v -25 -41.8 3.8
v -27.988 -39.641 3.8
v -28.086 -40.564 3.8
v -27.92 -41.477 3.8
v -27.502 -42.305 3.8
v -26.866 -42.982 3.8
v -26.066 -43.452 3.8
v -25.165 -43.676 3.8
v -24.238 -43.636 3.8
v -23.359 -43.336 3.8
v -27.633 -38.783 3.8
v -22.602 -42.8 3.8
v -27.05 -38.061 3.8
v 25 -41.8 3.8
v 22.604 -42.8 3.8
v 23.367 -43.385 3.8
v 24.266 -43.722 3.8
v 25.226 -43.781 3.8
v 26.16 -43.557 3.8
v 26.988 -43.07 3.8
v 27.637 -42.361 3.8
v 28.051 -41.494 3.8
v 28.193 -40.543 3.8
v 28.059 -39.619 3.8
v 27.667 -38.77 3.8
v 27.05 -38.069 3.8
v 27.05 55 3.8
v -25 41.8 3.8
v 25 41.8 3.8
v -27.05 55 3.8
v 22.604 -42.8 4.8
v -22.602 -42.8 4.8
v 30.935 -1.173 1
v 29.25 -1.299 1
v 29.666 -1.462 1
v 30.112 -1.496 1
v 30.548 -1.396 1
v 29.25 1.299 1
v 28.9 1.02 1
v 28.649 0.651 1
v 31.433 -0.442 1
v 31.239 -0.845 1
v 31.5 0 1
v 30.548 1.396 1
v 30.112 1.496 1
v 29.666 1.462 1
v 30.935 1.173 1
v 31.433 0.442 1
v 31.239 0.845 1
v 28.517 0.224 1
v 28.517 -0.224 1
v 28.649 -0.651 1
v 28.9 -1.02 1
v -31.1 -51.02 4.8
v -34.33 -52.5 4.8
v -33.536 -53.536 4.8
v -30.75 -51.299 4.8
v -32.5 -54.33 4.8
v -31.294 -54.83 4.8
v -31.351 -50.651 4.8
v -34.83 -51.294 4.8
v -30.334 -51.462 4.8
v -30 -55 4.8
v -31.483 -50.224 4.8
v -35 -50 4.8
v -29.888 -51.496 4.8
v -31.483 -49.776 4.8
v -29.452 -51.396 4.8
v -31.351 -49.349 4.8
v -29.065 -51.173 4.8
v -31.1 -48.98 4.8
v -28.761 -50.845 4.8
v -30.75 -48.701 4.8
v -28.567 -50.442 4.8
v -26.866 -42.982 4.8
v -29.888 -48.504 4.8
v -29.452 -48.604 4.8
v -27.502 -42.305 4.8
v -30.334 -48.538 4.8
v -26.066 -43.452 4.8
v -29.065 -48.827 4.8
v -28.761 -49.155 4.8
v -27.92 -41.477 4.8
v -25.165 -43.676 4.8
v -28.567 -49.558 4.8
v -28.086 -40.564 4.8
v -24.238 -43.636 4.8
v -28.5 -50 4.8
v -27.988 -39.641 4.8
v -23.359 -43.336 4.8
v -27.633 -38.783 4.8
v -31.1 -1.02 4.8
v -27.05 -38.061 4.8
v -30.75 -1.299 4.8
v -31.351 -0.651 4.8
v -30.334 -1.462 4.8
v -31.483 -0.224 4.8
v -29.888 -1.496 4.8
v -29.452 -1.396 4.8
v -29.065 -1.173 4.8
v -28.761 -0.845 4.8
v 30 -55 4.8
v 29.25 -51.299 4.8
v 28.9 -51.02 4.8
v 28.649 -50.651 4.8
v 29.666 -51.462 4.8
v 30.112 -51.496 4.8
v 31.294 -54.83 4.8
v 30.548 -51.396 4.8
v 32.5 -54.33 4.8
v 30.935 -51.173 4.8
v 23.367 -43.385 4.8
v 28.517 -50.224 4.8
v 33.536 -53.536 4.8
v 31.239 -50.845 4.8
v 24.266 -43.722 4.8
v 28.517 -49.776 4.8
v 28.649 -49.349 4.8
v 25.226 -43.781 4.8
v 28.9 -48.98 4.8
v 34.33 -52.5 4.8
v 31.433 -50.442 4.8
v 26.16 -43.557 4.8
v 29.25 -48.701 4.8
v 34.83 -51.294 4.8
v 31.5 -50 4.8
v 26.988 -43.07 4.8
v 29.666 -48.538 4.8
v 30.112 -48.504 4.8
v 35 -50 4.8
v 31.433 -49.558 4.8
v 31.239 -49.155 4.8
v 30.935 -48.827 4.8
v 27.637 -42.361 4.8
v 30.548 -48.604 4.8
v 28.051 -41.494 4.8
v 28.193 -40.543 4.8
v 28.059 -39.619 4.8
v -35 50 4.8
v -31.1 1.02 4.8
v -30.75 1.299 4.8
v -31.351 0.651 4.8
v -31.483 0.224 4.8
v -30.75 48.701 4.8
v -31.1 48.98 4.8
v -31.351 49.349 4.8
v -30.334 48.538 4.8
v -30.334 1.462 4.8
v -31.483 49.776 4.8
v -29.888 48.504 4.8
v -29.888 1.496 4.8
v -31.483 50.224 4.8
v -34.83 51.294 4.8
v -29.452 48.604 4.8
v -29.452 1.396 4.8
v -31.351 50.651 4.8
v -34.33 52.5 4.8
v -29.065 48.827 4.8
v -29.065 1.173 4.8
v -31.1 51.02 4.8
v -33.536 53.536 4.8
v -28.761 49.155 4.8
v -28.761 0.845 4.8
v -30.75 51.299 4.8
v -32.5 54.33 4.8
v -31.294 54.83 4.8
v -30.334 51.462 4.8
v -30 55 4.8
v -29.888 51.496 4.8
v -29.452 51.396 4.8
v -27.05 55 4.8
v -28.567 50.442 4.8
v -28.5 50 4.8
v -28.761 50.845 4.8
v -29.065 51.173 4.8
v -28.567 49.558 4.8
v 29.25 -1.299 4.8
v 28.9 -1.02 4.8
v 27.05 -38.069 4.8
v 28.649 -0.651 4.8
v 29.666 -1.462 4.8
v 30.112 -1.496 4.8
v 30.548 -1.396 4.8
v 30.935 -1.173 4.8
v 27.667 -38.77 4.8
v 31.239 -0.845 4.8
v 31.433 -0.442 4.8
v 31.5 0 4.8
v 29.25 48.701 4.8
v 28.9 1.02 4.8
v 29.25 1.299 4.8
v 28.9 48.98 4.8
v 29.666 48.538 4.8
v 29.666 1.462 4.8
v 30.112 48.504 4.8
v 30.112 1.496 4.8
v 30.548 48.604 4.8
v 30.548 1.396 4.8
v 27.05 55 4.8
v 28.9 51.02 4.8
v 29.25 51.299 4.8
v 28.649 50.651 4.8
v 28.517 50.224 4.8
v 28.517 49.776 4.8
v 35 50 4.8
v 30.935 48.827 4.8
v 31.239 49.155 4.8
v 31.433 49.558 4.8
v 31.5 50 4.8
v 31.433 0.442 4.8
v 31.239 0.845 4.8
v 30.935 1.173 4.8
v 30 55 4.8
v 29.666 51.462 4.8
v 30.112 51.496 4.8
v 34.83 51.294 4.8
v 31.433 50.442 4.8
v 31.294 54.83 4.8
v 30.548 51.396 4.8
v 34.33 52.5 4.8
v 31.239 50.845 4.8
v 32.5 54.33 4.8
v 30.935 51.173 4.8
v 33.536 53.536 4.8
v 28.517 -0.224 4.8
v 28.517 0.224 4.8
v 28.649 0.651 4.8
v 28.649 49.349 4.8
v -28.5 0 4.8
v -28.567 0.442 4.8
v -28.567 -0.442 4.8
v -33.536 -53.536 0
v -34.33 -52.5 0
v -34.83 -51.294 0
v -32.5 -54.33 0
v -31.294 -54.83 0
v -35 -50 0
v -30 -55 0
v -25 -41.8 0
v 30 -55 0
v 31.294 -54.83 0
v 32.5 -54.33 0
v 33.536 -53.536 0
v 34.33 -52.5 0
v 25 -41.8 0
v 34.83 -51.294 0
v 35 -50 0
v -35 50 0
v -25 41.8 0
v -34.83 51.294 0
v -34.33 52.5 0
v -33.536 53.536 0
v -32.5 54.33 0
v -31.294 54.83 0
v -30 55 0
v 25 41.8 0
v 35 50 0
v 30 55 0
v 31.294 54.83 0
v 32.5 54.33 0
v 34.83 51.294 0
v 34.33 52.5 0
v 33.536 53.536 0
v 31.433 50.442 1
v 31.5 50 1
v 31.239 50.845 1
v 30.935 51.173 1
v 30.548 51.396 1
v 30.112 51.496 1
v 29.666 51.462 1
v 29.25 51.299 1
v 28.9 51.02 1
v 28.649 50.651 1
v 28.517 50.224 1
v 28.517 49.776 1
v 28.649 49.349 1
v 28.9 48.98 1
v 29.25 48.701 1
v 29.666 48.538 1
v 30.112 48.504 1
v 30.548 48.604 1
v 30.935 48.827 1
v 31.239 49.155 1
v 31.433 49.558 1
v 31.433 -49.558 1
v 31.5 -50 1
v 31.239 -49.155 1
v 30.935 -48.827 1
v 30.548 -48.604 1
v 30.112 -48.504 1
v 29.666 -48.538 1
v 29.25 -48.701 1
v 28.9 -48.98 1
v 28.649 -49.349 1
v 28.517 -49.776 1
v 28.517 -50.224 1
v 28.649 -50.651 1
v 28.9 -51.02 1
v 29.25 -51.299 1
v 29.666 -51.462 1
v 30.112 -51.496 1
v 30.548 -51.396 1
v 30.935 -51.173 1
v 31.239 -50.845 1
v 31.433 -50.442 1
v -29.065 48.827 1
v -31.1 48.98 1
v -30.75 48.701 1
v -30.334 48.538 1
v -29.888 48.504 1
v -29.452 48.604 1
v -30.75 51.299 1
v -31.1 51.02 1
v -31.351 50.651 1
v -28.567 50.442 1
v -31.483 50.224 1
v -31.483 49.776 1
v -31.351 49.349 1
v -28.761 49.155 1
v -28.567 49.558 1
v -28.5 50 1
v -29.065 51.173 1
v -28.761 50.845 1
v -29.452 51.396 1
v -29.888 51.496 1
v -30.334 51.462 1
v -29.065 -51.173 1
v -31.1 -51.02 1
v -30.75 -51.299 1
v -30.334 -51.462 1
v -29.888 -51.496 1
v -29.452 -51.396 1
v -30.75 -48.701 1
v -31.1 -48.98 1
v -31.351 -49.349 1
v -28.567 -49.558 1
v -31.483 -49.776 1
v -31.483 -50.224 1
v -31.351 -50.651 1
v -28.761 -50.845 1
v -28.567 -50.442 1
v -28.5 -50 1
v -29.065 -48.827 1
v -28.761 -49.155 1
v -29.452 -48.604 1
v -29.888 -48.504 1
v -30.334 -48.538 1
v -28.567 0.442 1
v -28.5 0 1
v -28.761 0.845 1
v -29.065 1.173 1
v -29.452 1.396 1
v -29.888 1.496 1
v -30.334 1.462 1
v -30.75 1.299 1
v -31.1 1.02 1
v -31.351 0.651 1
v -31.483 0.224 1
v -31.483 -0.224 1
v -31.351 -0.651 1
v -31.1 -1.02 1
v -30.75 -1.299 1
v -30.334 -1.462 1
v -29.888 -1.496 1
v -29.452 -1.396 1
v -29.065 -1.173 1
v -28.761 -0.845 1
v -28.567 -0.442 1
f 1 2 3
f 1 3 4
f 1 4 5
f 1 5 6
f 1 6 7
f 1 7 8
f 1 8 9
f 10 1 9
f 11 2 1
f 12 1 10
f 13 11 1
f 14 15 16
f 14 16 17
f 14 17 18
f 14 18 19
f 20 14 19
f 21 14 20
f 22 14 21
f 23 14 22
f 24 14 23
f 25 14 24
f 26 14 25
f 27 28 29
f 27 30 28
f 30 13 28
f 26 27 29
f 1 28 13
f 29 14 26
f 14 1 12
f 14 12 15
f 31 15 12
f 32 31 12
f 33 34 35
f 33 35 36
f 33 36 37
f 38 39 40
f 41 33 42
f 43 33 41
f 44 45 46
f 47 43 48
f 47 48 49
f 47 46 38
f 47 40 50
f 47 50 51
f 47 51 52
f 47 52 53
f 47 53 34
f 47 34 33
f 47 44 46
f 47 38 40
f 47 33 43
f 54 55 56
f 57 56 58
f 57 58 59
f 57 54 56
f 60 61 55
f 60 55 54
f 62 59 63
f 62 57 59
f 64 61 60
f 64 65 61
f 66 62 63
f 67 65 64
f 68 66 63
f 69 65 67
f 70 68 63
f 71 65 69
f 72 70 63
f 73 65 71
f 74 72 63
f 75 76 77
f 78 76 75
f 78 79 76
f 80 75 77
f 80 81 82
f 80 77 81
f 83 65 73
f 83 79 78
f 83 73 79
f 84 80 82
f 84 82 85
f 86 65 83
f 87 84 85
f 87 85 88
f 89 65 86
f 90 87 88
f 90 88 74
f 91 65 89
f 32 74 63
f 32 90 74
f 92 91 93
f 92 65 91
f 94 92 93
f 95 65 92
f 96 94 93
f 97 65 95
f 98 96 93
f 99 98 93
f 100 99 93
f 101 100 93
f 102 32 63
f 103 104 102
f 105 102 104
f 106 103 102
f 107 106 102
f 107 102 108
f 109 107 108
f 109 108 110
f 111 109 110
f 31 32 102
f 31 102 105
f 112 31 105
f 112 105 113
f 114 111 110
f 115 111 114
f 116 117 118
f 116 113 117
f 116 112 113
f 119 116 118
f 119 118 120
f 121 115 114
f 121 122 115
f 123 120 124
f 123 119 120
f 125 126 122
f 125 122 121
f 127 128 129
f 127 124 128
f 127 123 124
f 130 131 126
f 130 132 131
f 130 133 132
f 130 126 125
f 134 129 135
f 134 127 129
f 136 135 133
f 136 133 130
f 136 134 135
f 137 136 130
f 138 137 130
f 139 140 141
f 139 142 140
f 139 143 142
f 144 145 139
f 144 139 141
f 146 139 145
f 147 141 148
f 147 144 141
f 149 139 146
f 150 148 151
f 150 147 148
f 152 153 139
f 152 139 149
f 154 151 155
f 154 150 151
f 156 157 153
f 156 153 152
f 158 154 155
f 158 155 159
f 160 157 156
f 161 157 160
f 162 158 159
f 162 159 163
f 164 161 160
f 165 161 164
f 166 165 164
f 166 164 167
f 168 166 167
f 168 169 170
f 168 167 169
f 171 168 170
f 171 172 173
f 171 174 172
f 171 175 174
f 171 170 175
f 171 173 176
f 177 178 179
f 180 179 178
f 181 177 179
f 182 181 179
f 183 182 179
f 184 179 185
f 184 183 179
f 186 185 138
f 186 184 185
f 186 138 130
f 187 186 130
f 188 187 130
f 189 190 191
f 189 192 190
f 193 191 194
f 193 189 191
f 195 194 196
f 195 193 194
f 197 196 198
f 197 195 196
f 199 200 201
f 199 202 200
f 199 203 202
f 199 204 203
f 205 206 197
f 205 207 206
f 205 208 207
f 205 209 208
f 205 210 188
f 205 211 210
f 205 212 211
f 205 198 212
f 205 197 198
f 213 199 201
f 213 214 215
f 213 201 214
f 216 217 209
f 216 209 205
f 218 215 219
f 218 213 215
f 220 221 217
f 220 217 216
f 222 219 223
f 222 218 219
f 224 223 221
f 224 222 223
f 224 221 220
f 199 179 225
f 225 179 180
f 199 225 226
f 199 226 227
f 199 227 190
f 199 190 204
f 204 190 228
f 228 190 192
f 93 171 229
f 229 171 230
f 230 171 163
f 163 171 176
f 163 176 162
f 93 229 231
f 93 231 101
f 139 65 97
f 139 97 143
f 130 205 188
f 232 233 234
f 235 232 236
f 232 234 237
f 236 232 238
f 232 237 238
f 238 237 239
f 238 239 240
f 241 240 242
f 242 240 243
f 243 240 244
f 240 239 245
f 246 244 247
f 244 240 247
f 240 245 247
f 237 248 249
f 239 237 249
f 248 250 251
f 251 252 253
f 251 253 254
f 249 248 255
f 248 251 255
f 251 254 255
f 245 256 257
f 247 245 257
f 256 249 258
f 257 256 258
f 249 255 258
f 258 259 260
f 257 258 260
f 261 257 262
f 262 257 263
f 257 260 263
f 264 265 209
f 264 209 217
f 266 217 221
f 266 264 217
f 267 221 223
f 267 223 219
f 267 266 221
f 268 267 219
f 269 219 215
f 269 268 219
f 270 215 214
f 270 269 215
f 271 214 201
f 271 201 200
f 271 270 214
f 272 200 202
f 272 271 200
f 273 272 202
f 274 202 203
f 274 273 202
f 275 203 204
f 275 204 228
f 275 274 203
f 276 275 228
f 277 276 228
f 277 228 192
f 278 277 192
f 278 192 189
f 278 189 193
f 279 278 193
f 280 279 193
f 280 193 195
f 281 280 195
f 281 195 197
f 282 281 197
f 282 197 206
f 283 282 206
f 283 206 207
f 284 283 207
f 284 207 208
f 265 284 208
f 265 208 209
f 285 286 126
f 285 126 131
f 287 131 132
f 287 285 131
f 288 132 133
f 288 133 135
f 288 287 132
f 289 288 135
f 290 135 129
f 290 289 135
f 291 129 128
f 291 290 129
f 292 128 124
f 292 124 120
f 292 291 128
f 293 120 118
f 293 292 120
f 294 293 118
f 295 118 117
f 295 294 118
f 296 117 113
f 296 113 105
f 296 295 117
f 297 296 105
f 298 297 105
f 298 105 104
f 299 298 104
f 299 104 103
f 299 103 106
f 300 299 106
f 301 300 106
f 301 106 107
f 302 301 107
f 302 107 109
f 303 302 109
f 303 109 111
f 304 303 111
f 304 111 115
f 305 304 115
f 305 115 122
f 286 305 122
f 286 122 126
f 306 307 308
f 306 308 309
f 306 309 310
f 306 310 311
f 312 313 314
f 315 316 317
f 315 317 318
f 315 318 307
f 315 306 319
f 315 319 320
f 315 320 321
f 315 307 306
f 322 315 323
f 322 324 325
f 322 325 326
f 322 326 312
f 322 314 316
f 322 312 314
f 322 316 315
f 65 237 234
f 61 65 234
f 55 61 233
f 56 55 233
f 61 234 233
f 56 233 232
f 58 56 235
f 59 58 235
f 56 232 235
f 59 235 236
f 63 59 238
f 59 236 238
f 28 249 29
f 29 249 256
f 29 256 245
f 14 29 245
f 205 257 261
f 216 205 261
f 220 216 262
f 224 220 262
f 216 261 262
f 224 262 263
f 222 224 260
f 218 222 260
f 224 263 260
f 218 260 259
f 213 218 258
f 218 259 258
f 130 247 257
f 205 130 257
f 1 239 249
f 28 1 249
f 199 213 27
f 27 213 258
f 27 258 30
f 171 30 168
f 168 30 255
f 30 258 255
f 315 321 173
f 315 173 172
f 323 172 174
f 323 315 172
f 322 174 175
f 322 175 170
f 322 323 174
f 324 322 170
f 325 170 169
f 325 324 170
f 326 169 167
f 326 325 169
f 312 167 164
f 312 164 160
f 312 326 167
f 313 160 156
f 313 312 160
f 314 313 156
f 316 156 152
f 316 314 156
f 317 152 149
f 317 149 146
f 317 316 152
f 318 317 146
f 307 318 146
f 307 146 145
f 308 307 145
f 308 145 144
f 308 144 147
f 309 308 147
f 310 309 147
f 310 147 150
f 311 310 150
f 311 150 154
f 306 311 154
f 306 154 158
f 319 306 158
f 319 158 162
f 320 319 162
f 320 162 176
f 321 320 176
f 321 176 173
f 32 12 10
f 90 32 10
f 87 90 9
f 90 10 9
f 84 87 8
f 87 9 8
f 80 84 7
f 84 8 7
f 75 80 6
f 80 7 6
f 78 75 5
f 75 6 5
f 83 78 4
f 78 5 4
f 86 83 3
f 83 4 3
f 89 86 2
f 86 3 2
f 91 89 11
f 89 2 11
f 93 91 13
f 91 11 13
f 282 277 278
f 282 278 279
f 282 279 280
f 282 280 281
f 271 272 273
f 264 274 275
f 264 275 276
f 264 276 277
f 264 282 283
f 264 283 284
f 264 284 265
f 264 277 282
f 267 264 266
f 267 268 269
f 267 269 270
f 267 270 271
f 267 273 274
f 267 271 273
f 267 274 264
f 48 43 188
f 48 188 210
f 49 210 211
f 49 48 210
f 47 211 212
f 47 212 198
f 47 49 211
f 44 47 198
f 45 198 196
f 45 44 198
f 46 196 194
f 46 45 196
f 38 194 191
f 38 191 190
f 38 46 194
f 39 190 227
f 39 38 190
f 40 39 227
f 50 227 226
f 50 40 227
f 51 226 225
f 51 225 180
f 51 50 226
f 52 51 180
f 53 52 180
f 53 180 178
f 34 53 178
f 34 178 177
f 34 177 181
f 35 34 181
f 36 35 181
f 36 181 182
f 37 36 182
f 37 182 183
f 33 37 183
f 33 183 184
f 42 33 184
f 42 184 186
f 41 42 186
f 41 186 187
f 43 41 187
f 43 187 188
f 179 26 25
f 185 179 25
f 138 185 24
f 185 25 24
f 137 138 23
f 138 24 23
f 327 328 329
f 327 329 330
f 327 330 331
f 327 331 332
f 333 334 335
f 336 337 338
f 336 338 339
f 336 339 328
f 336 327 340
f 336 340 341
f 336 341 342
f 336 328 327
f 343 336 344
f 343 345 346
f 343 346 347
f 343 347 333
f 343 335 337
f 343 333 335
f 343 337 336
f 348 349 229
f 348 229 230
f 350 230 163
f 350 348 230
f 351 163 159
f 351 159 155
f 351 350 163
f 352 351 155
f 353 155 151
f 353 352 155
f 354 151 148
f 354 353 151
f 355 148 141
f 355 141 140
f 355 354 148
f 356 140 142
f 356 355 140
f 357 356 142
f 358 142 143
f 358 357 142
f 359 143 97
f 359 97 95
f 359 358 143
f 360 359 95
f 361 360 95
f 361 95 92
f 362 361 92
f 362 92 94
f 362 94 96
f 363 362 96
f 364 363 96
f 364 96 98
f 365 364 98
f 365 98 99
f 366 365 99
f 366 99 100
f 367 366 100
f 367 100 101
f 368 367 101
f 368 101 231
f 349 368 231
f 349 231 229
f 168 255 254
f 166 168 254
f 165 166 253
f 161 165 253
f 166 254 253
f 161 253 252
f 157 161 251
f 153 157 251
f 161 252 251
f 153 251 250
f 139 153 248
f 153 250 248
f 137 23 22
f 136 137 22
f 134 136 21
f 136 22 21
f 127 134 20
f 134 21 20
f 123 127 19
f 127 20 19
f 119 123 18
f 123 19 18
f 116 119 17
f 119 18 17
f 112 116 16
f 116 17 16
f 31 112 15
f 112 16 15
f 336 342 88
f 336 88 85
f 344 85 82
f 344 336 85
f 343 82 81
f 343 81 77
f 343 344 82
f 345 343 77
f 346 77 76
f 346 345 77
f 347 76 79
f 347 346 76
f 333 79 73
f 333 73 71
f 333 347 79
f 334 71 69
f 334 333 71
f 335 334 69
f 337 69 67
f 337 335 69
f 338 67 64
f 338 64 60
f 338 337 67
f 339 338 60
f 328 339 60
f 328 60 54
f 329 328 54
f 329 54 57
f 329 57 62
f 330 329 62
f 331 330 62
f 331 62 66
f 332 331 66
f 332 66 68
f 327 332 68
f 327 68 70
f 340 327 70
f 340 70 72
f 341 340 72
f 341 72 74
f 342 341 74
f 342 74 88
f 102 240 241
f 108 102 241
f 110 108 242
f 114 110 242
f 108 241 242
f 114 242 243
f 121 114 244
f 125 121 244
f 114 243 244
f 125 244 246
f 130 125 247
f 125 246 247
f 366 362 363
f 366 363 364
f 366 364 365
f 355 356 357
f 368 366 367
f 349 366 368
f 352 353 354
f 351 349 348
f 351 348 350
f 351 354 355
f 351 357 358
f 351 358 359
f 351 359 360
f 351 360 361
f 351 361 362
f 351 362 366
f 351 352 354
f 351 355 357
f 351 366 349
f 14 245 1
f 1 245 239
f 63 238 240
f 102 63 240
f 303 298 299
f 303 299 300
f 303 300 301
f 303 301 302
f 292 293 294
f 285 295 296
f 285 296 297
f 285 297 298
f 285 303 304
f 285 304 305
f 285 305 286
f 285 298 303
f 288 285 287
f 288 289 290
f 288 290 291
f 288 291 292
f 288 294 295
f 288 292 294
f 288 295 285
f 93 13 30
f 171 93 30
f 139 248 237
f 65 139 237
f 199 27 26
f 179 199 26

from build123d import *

# Parameters (mm, degrees)
F0_R     = 1.5
F1_DEPTH = 1
F2_DEPTH = 3.8
F3_DEPTH = 4.8


with BuildPart() as f1:
    # F0 (on Top) → F1 (new body)
    with BuildSketch(Plane.XY):
        with Locations((-30, 50)):
            Circle(F0_R)
    extrude(amount=F1_DEPTH)



with BuildPart() as f1b:
    # F0 (on Top) → F1, piece 2 (new body)
    with BuildSketch(Plane.XY):
        with Locations((30, 50)):
            Circle(F0_R)
    extrude(amount=F1_DEPTH)


with BuildPart() as f1c:
    # F0 (on Top) → F1, piece 3 (new body)
    with BuildSketch(Plane.XY):
        with Locations((30, 0)):
            Circle(F0_R)
    extrude(amount=F1_DEPTH)


with BuildPart() as f1d:
    # F0 (on Top) → F1, piece 4 (new body)
    with BuildSketch(Plane.XY):
        with Locations((30, -50)):
            Circle(F0_R)
    extrude(amount=F1_DEPTH)


with BuildPart() as f1e:
    # F0 (on Top) → F1, piece 5 (new body)
    with BuildSketch(Plane.XY):
        with Locations((-30, -50)):
            Circle(F0_R)
    extrude(amount=F1_DEPTH)


with BuildPart() as f1f:
    # F0 (on Top) → F1, piece 6 (new body)
    with BuildSketch(Plane.XY):
        with Locations((-30, 0)):
            Circle(F0_R)
    extrude(amount=F1_DEPTH)


with BuildPart() as f2:
    # F0 (on Top) → F2 (new body)
    with BuildSketch(Plane.XY):
        with BuildLine():
            Line((27.05, 42.8), (27.05, 55))
            Line((27.05, 55), (-27.05, 55))
            Line((-27.05, 55), (-27.05, 42.8))
            Line((-27.05, 42.8), (-27.05, -38.0607364771))
            ThreePointArc((-27.05, -38.0607364771), (-26.1012649001, -37.4476793164), (-25, -37.196376726))
            Line((-25, -37.196376726), (-25, 41.8))
            Line((-25, 41.8), (25, 41.8))
            Line((25, 41.8), (25, -37.2939372294))
            ThreePointArc((25, -37.2939372294), (26.0922729799, -37.5033114474), (27.05, -38.0686934251))
            Line((27.05, -38.0686934251), (27.05, 42.8))
        make_face()
        with BuildLine():
            ThreePointArc((-25, -37.196376726), (-26.1012649001, -37.4476793164), (-27.05, -38.0607364771))
            Line((-27.05, -38.0607364771), (-27.05, -42.8))
            Line((-27.05, -42.8), (-22.6016124349, -42.8))
            ThreePointArc((-22.6016124349, -42.8), (-22.1959427347, -42.3341702613), (-21.8857373462, -41.8))
            Line((-21.8857373462, -41.8), (-25, -41.8))
            Line((-25, -41.8), (-25, -37.196376726))
        make_face()
        with BuildLine():
            Line((-27.05, -42.8), (-27.05, -38.0607364771))
            ThreePointArc((-27.05, -38.0607364771), (-27.208254731, -42.6665921352), (-22.6016124349, -42.8))
            Line((-22.6016124349, -42.8), (-27.05, -42.8))
        make_face()
        with BuildLine():
            ThreePointArc((-21.8857373462, -41.8), (-22.1959427347, -42.3341702613), (-22.6016124349, -42.8))
            Line((-22.6016124349, -42.8), (22.6044172499, -42.8))
            ThreePointArc((22.6044172499, -42.8), (22.2287912639, -42.3305781393), (21.9460571083, -41.8))
            Line((21.9460571083, -41.8), (-21.8857373462, -41.8))
        make_face()
        with BuildLine():
            Line((27.05, -42.8), (27.05, -38.0686934251))
            ThreePointArc((27.05, -38.0686934251), (26.0922729799, -37.5033114474), (25, -37.2939372294))
            Line((25, -37.2939372294), (25, -41.8))
            Line((25, -41.8), (21.9460571083, -41.8))
            ThreePointArc((21.9460571083, -41.8), (22.2287912639, -42.3305781393), (22.6044172499, -42.8))
            Line((22.6044172499, -42.8), (27.05, -42.8))
        make_face()
        with BuildLine():
            ThreePointArc((28.1933165581, -40.5434428822), (27.8936742641, -39.1803987131), (27.05, -38.0686934251))
            Line((27.05, -38.0686934251), (27.05, -42.8))
            Line((27.05, -42.8), (22.6044172499, -42.8))
            ThreePointArc((22.6044172499, -42.8), (26.1600904172, -43.557072152), (28.1933165581, -40.5434428822))
        make_face()
    extrude(amount=F2_DEPTH)


with BuildPart() as f1_1:
    add(f1.part)

    add(f1b.part)  # F3 merges F1b

    add(f1c.part)  # F3 merges F1c

    add(f1d.part)  # F3 merges F1d

    add(f1e.part)  # F3 merges F1e

    add(f1f.part)  # F3 merges F1f

    add(f2.part)  # F3 merges F2
    # F0 (on Top) → F3 (join)
    with BuildSketch(Plane.XY):
        with BuildLine():
            ThreePointArc((35, 50), (33.5355339059, 53.5355339059), (30, 55))
            Line((30, 55), (27.05, 55))
            Line((27.05, 55), (27.05, 42.8))
            Line((27.05, 42.8), (27.05, -38.0686934251))
            ThreePointArc((27.05, -38.0686934251), (27.8936742641, -39.1803987131), (28.1933165581, -40.5434428822))
            ThreePointArc((28.1933165581, -40.5434428822), (26.1600904172, -43.557072152), (22.6044172499, -42.8))
            Line((22.6044172499, -42.8), (-22.6016124349, -42.8))
            ThreePointArc((-22.6016124349, -42.8), (-27.208254731, -42.6665921352), (-27.05, -38.0607364771))
            Line((-27.05, -38.0607364771), (-27.05, 42.8))
            Line((-27.05, 42.8), (-27.05, 55))
            Line((-27.05, 55), (-30, 55))
            ThreePointArc((-30, 55), (-33.5355339059, 53.5355339059), (-35, 50))
            Line((-35, 50), (-35, -50))
            ThreePointArc((-35, -50), (-33.5355339059, -53.5355339059), (-30, -55))
            Line((-30, -55), (30, -55))
            ThreePointArc((30, -55), (33.5355339059, -53.5355339059), (35, -50))
            Line((35, -50), (35, 50))
        make_face()
        with Locations((-30, -50)):
            Circle(F0_R, mode=Mode.SUBTRACT)
        with Locations((30, -50)):
            Circle(F0_R, mode=Mode.SUBTRACT)
        with Locations((-30, 0)):
            Circle(F0_R, mode=Mode.SUBTRACT)
        with Locations((-30, 50)):
            Circle(F0_R, mode=Mode.SUBTRACT)
        with Locations((30, 0)):
            Circle(F0_R, mode=Mode.SUBTRACT)
        with Locations((30, 50)):
            Circle(F0_R, mode=Mode.SUBTRACT)
    extrude(amount=F3_DEPTH)


solid = f1_1.part
